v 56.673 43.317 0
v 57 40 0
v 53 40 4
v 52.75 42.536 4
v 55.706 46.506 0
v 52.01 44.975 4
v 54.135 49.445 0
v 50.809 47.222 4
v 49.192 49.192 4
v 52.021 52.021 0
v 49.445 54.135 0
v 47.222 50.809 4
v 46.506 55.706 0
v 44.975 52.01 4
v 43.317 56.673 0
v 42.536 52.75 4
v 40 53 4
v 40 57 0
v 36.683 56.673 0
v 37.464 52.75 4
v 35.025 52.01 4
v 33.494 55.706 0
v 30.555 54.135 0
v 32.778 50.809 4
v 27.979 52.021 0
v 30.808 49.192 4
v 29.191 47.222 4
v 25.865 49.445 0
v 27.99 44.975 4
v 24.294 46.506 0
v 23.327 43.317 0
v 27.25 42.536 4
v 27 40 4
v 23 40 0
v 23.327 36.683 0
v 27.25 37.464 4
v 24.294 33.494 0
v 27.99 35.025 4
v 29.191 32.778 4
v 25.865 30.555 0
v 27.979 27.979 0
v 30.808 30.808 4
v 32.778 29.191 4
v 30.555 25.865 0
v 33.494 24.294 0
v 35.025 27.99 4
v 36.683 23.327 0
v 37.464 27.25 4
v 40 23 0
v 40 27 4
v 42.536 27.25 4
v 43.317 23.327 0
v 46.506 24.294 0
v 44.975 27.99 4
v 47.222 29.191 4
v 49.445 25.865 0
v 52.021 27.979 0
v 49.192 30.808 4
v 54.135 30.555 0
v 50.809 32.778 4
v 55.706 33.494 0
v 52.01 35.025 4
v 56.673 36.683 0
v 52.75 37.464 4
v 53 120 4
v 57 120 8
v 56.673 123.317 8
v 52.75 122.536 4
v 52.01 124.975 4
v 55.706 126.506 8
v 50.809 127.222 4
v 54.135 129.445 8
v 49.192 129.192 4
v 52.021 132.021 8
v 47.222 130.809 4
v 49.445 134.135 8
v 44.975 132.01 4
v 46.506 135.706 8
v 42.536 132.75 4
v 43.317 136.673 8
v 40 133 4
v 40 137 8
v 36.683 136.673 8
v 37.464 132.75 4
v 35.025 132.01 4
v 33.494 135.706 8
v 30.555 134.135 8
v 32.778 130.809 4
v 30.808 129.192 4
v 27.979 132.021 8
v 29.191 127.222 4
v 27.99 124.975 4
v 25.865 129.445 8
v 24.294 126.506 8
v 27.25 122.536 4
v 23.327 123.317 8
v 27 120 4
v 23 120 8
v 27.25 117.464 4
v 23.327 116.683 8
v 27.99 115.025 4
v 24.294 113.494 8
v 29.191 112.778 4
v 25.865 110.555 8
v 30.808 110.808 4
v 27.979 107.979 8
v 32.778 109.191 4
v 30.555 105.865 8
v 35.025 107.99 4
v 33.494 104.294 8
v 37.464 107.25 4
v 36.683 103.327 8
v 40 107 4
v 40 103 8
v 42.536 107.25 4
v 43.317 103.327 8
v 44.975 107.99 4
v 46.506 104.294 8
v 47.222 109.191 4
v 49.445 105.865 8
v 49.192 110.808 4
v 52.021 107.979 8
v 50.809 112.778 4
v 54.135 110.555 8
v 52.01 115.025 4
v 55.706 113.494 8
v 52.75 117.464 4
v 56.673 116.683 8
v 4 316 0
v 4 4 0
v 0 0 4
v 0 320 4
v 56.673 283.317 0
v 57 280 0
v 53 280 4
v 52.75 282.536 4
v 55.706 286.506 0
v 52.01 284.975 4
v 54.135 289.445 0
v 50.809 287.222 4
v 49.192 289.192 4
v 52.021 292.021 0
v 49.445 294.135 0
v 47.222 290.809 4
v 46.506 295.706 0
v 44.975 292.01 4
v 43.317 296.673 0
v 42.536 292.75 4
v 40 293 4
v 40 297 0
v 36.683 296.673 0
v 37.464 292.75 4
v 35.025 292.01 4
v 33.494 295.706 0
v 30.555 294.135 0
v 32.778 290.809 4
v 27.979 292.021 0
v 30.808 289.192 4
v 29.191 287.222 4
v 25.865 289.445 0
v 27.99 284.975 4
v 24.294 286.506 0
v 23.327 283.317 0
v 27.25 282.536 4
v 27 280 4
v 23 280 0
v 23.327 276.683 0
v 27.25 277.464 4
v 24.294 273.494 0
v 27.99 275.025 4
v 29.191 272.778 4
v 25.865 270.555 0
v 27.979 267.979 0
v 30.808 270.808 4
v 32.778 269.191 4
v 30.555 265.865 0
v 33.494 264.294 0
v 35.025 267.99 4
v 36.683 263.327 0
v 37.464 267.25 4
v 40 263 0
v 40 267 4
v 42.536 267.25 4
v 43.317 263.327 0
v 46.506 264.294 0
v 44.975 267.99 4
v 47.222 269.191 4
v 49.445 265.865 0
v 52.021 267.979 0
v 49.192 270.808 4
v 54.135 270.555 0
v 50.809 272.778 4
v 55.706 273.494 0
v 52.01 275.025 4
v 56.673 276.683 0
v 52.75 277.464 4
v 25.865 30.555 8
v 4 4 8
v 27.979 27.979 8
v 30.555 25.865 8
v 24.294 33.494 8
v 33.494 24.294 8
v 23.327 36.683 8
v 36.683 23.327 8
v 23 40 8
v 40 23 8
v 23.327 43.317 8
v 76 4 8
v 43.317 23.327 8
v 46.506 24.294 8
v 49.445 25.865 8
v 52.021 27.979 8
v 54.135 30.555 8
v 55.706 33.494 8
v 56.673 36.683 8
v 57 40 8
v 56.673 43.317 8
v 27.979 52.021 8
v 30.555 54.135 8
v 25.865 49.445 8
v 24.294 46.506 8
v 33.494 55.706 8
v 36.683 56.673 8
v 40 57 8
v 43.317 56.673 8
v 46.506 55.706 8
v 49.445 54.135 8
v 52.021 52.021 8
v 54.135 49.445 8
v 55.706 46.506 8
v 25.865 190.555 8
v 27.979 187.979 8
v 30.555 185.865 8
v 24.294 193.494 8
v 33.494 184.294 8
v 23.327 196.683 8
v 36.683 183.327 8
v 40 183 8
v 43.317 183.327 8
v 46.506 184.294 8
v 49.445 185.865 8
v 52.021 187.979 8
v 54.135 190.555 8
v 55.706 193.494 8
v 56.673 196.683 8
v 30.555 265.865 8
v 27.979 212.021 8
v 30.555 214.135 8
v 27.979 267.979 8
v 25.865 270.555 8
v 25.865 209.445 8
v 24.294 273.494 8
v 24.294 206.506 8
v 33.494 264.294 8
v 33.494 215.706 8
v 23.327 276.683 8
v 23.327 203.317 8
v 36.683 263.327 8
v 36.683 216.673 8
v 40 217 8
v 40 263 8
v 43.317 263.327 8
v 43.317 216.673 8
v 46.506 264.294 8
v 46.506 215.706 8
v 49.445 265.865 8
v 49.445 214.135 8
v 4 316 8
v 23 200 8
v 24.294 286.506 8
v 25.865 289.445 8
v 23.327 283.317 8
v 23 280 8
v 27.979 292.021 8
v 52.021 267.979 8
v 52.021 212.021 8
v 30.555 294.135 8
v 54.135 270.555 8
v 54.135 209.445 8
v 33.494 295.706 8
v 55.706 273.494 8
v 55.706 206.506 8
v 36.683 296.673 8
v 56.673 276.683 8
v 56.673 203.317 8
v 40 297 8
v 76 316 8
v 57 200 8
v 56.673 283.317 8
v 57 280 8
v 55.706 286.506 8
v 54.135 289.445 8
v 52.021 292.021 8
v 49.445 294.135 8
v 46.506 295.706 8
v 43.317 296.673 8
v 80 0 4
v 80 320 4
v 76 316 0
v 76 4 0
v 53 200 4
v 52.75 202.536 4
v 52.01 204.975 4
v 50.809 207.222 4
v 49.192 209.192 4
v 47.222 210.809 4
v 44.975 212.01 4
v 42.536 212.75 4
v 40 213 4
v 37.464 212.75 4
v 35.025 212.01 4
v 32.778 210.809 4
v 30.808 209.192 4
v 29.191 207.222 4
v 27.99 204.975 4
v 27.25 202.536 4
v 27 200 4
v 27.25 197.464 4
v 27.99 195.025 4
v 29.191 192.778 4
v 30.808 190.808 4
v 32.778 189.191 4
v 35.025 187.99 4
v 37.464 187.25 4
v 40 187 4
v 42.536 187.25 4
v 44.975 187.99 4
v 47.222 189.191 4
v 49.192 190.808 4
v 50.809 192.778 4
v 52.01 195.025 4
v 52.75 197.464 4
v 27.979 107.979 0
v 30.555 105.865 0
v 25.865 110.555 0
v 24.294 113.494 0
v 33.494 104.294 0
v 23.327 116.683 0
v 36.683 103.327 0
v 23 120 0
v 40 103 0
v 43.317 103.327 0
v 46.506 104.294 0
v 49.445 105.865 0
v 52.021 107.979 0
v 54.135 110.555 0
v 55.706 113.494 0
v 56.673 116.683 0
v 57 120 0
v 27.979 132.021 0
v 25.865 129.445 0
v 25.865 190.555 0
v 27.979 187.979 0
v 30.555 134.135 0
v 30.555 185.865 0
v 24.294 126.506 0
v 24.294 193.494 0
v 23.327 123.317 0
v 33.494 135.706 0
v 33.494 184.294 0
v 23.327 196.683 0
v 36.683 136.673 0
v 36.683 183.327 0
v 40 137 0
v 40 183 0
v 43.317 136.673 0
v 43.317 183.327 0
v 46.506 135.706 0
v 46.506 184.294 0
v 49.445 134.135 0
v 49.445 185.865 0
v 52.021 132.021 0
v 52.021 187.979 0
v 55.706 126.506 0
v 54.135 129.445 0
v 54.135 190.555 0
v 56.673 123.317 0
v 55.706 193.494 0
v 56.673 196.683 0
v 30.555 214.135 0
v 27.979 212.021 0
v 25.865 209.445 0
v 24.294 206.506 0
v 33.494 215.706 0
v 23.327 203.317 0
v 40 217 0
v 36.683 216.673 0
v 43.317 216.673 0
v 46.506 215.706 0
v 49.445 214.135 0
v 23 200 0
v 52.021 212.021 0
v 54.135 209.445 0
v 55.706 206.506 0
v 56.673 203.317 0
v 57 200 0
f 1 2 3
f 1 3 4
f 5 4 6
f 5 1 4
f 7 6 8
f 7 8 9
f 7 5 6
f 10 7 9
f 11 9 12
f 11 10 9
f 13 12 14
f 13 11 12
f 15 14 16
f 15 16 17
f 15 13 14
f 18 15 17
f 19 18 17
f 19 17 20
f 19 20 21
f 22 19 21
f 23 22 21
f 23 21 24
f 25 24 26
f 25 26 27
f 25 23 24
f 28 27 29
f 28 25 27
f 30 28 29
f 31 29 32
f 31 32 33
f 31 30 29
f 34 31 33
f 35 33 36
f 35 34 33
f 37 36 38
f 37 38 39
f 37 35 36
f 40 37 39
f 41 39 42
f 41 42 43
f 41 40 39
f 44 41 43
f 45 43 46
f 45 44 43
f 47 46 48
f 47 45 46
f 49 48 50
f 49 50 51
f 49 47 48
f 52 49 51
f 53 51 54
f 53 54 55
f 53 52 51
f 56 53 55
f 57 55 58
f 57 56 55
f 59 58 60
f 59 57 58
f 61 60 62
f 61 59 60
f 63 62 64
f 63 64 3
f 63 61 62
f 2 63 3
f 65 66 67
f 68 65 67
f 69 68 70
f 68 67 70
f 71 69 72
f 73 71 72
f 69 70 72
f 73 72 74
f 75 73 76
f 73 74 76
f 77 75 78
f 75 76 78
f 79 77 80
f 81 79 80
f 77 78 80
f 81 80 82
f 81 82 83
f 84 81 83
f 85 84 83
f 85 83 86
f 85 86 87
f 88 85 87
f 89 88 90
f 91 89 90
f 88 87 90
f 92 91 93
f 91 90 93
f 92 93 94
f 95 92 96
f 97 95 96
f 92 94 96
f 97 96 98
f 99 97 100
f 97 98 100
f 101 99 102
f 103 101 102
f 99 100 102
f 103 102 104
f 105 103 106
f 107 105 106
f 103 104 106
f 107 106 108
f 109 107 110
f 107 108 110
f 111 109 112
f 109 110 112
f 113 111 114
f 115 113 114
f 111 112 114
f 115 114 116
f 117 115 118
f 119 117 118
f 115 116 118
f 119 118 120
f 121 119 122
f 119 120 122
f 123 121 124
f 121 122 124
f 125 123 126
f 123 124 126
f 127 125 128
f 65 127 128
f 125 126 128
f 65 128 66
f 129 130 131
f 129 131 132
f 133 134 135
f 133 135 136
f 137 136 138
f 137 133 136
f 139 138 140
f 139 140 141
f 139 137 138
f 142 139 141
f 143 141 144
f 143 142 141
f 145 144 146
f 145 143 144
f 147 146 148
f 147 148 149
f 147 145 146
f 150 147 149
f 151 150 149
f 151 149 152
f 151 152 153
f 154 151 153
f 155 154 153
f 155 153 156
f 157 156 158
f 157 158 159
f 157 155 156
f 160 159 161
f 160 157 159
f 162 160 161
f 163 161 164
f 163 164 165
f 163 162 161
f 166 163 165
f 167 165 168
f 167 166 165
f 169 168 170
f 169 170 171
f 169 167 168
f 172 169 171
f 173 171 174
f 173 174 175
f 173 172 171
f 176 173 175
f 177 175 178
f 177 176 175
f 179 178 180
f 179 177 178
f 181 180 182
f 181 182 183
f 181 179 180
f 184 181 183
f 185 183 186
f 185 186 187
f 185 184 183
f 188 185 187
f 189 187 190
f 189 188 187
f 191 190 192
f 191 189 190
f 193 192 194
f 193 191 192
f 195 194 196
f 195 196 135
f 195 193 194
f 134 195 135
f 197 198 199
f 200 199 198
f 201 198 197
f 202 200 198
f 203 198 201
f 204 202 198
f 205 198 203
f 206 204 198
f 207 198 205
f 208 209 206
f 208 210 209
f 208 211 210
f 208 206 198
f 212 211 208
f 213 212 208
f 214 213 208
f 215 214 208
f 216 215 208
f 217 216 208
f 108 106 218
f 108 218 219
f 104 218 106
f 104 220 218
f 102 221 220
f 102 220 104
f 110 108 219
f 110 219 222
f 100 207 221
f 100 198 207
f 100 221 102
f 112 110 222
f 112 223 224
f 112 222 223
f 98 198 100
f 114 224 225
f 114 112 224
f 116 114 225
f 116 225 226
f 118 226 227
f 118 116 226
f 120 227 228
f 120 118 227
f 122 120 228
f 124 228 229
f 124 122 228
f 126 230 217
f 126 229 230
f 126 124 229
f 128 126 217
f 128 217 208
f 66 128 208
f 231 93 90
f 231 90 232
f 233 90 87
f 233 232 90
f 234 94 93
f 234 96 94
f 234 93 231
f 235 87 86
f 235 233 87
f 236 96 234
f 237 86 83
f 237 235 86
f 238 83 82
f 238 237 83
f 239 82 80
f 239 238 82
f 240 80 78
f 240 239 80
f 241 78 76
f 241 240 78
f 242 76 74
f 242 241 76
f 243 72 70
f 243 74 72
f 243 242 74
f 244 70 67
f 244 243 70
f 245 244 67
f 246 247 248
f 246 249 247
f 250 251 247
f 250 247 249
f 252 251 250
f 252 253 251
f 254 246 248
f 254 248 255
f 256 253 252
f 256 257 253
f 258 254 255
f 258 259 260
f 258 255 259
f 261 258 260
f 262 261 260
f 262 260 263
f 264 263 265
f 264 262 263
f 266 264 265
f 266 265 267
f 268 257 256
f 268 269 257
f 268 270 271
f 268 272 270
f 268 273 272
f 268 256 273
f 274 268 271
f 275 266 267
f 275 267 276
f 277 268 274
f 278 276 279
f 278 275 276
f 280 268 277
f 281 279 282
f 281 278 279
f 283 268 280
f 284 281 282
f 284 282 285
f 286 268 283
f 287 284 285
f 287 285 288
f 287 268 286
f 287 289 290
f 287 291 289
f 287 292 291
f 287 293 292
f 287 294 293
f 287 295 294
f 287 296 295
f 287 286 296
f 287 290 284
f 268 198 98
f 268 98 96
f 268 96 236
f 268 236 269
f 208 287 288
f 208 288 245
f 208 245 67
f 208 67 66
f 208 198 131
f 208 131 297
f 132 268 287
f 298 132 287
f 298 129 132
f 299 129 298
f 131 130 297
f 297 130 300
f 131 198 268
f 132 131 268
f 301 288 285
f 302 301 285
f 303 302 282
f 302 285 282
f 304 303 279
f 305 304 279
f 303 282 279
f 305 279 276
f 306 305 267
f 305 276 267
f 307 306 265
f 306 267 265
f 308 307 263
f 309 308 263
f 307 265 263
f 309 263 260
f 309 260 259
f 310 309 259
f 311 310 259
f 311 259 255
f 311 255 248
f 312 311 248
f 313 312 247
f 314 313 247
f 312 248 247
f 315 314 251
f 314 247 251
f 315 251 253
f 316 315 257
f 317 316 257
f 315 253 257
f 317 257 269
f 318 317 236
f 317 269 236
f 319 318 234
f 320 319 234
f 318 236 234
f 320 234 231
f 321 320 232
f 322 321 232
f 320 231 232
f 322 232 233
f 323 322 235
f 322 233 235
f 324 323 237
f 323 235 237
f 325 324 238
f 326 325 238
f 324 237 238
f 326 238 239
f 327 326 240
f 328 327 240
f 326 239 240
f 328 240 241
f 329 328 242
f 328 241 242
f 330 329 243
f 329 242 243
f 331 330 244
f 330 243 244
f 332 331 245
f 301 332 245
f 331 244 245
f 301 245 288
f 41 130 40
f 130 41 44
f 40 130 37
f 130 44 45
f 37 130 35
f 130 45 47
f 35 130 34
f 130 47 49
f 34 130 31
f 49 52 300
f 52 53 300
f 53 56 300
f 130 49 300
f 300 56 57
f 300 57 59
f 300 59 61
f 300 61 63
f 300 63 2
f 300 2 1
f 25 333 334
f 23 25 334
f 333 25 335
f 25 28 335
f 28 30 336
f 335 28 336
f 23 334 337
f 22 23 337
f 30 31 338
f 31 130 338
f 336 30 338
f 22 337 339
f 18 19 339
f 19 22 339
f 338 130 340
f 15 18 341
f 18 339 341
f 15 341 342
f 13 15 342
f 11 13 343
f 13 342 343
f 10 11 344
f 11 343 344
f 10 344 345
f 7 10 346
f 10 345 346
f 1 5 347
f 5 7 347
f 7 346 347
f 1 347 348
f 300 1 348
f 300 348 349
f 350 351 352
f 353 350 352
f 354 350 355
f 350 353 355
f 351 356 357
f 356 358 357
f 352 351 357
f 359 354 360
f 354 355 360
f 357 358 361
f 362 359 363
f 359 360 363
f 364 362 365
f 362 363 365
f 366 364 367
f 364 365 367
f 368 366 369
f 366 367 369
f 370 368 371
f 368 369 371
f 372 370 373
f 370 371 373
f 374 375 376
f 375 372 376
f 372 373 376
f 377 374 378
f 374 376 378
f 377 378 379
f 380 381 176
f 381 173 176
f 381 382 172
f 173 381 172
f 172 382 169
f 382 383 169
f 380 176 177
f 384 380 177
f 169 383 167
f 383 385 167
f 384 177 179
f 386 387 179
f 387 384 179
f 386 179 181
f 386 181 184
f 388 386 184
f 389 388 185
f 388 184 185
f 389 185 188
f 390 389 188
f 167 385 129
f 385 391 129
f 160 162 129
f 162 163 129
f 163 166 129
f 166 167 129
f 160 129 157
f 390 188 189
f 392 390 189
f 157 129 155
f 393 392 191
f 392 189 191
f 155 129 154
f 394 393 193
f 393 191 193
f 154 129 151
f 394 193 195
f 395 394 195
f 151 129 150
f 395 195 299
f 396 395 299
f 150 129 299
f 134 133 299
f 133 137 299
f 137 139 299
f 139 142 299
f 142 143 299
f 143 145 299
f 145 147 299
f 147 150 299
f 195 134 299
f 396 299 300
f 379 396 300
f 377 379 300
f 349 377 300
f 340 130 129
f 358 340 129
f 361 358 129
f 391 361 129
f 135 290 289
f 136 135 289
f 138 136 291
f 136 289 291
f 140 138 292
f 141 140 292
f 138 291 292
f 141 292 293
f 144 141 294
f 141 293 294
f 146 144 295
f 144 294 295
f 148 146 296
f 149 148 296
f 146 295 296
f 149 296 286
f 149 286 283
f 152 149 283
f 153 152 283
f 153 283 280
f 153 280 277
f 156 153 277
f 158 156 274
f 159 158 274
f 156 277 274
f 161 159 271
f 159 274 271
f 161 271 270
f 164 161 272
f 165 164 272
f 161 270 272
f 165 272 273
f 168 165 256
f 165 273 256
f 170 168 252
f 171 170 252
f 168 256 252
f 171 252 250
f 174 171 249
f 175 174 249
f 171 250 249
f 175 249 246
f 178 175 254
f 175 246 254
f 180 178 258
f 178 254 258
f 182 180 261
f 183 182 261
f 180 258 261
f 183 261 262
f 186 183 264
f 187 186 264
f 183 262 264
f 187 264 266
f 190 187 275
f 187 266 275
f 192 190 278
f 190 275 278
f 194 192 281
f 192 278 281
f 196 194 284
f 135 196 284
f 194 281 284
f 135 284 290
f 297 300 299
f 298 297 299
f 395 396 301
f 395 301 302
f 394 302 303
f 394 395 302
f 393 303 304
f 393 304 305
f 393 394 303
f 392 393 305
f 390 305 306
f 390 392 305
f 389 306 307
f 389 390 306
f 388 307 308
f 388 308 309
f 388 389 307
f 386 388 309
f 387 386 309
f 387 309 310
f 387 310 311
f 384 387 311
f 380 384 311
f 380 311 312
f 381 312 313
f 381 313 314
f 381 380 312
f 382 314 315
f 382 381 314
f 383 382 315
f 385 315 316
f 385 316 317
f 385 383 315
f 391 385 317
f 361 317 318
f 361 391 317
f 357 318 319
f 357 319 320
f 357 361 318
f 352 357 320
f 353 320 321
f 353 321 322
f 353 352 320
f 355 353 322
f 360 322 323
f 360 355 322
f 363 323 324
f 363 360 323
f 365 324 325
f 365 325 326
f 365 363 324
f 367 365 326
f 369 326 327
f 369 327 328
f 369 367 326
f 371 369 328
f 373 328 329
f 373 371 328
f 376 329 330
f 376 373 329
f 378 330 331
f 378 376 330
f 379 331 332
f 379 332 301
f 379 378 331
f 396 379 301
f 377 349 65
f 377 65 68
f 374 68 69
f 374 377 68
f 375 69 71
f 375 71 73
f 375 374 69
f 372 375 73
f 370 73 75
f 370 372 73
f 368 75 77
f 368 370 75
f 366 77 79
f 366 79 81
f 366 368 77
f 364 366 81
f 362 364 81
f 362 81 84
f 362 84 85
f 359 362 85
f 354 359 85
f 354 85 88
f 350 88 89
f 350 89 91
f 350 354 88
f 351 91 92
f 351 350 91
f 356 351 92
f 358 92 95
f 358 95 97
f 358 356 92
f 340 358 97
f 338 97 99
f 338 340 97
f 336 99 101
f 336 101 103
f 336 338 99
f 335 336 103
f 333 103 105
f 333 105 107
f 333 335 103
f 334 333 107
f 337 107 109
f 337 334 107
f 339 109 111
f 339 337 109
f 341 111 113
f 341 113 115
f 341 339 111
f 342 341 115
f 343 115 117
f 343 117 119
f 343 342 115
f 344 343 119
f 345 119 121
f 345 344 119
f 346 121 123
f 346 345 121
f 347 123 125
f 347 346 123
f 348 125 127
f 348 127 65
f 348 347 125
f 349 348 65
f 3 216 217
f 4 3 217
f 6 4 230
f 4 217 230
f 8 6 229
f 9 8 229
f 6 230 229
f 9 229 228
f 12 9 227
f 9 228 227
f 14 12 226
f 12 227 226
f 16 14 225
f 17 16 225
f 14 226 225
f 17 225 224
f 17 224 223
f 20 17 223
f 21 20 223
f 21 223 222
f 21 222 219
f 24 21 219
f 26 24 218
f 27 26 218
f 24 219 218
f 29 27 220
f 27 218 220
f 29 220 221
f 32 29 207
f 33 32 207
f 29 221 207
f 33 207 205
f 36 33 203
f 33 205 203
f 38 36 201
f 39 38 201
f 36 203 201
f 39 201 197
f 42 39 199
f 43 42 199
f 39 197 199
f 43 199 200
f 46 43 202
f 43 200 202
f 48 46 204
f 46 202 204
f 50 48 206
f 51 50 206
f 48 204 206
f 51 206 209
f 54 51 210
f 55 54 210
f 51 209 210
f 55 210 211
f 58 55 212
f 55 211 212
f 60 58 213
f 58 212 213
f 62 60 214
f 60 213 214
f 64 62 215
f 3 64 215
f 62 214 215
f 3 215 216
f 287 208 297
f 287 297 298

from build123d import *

# Parameters (mm, degrees)
SKETCH_1_W        = 80
SKETCH_1_H        = 320
SKETCH_1_R        = 13
EXTRUDE_324_DEPTH = 8
CHAMFER_1_SIZE    = 4


with BuildPart() as part:
    # 草图1 → Extrude 324 (new body)
    with BuildSketch(Plane.XY):
        with Locations((40, 160)):
            Rectangle(SKETCH_1_W, SKETCH_1_H)
        with Locations((40, 280)):
            Circle(SKETCH_1_R, mode=Mode.SUBTRACT)
        with Locations((40, 200)):
            Circle(SKETCH_1_R, mode=Mode.SUBTRACT)
        with Locations((40, 120)):
            Circle(SKETCH_1_R, mode=Mode.SUBTRACT)
        with Locations((40, 40)):
            Circle(SKETCH_1_R, mode=Mode.SUBTRACT)
    extrude(amount=EXTRUDE_324_DEPTH)

    # 倒角1
    chamfer_1_edges = [part.edges().sort_by_distance(p)[0] for p in [
        (27, 40, 0),
        (27, 200, 0),
        (40, 0, 0),
        (80, 160, 0),
        (40, 320, 0),
        (0, 160, 0),
        (27, 280, 0),
        (27, 120, 0),
        (27, 40, 8),
        (27, 200, 8),
        (40, 320, 8),
        (80, 160, 8),
        (40, 0, 8),
        (0, 160, 8),
        (27, 280, 8),
        (27, 120, 8),
    ]]
    chamfer(chamfer_1_edges, length=CHAMFER_1_SIZE - 0.0001)  # a hair under: the kernel refuses the full size


solid = part.part
